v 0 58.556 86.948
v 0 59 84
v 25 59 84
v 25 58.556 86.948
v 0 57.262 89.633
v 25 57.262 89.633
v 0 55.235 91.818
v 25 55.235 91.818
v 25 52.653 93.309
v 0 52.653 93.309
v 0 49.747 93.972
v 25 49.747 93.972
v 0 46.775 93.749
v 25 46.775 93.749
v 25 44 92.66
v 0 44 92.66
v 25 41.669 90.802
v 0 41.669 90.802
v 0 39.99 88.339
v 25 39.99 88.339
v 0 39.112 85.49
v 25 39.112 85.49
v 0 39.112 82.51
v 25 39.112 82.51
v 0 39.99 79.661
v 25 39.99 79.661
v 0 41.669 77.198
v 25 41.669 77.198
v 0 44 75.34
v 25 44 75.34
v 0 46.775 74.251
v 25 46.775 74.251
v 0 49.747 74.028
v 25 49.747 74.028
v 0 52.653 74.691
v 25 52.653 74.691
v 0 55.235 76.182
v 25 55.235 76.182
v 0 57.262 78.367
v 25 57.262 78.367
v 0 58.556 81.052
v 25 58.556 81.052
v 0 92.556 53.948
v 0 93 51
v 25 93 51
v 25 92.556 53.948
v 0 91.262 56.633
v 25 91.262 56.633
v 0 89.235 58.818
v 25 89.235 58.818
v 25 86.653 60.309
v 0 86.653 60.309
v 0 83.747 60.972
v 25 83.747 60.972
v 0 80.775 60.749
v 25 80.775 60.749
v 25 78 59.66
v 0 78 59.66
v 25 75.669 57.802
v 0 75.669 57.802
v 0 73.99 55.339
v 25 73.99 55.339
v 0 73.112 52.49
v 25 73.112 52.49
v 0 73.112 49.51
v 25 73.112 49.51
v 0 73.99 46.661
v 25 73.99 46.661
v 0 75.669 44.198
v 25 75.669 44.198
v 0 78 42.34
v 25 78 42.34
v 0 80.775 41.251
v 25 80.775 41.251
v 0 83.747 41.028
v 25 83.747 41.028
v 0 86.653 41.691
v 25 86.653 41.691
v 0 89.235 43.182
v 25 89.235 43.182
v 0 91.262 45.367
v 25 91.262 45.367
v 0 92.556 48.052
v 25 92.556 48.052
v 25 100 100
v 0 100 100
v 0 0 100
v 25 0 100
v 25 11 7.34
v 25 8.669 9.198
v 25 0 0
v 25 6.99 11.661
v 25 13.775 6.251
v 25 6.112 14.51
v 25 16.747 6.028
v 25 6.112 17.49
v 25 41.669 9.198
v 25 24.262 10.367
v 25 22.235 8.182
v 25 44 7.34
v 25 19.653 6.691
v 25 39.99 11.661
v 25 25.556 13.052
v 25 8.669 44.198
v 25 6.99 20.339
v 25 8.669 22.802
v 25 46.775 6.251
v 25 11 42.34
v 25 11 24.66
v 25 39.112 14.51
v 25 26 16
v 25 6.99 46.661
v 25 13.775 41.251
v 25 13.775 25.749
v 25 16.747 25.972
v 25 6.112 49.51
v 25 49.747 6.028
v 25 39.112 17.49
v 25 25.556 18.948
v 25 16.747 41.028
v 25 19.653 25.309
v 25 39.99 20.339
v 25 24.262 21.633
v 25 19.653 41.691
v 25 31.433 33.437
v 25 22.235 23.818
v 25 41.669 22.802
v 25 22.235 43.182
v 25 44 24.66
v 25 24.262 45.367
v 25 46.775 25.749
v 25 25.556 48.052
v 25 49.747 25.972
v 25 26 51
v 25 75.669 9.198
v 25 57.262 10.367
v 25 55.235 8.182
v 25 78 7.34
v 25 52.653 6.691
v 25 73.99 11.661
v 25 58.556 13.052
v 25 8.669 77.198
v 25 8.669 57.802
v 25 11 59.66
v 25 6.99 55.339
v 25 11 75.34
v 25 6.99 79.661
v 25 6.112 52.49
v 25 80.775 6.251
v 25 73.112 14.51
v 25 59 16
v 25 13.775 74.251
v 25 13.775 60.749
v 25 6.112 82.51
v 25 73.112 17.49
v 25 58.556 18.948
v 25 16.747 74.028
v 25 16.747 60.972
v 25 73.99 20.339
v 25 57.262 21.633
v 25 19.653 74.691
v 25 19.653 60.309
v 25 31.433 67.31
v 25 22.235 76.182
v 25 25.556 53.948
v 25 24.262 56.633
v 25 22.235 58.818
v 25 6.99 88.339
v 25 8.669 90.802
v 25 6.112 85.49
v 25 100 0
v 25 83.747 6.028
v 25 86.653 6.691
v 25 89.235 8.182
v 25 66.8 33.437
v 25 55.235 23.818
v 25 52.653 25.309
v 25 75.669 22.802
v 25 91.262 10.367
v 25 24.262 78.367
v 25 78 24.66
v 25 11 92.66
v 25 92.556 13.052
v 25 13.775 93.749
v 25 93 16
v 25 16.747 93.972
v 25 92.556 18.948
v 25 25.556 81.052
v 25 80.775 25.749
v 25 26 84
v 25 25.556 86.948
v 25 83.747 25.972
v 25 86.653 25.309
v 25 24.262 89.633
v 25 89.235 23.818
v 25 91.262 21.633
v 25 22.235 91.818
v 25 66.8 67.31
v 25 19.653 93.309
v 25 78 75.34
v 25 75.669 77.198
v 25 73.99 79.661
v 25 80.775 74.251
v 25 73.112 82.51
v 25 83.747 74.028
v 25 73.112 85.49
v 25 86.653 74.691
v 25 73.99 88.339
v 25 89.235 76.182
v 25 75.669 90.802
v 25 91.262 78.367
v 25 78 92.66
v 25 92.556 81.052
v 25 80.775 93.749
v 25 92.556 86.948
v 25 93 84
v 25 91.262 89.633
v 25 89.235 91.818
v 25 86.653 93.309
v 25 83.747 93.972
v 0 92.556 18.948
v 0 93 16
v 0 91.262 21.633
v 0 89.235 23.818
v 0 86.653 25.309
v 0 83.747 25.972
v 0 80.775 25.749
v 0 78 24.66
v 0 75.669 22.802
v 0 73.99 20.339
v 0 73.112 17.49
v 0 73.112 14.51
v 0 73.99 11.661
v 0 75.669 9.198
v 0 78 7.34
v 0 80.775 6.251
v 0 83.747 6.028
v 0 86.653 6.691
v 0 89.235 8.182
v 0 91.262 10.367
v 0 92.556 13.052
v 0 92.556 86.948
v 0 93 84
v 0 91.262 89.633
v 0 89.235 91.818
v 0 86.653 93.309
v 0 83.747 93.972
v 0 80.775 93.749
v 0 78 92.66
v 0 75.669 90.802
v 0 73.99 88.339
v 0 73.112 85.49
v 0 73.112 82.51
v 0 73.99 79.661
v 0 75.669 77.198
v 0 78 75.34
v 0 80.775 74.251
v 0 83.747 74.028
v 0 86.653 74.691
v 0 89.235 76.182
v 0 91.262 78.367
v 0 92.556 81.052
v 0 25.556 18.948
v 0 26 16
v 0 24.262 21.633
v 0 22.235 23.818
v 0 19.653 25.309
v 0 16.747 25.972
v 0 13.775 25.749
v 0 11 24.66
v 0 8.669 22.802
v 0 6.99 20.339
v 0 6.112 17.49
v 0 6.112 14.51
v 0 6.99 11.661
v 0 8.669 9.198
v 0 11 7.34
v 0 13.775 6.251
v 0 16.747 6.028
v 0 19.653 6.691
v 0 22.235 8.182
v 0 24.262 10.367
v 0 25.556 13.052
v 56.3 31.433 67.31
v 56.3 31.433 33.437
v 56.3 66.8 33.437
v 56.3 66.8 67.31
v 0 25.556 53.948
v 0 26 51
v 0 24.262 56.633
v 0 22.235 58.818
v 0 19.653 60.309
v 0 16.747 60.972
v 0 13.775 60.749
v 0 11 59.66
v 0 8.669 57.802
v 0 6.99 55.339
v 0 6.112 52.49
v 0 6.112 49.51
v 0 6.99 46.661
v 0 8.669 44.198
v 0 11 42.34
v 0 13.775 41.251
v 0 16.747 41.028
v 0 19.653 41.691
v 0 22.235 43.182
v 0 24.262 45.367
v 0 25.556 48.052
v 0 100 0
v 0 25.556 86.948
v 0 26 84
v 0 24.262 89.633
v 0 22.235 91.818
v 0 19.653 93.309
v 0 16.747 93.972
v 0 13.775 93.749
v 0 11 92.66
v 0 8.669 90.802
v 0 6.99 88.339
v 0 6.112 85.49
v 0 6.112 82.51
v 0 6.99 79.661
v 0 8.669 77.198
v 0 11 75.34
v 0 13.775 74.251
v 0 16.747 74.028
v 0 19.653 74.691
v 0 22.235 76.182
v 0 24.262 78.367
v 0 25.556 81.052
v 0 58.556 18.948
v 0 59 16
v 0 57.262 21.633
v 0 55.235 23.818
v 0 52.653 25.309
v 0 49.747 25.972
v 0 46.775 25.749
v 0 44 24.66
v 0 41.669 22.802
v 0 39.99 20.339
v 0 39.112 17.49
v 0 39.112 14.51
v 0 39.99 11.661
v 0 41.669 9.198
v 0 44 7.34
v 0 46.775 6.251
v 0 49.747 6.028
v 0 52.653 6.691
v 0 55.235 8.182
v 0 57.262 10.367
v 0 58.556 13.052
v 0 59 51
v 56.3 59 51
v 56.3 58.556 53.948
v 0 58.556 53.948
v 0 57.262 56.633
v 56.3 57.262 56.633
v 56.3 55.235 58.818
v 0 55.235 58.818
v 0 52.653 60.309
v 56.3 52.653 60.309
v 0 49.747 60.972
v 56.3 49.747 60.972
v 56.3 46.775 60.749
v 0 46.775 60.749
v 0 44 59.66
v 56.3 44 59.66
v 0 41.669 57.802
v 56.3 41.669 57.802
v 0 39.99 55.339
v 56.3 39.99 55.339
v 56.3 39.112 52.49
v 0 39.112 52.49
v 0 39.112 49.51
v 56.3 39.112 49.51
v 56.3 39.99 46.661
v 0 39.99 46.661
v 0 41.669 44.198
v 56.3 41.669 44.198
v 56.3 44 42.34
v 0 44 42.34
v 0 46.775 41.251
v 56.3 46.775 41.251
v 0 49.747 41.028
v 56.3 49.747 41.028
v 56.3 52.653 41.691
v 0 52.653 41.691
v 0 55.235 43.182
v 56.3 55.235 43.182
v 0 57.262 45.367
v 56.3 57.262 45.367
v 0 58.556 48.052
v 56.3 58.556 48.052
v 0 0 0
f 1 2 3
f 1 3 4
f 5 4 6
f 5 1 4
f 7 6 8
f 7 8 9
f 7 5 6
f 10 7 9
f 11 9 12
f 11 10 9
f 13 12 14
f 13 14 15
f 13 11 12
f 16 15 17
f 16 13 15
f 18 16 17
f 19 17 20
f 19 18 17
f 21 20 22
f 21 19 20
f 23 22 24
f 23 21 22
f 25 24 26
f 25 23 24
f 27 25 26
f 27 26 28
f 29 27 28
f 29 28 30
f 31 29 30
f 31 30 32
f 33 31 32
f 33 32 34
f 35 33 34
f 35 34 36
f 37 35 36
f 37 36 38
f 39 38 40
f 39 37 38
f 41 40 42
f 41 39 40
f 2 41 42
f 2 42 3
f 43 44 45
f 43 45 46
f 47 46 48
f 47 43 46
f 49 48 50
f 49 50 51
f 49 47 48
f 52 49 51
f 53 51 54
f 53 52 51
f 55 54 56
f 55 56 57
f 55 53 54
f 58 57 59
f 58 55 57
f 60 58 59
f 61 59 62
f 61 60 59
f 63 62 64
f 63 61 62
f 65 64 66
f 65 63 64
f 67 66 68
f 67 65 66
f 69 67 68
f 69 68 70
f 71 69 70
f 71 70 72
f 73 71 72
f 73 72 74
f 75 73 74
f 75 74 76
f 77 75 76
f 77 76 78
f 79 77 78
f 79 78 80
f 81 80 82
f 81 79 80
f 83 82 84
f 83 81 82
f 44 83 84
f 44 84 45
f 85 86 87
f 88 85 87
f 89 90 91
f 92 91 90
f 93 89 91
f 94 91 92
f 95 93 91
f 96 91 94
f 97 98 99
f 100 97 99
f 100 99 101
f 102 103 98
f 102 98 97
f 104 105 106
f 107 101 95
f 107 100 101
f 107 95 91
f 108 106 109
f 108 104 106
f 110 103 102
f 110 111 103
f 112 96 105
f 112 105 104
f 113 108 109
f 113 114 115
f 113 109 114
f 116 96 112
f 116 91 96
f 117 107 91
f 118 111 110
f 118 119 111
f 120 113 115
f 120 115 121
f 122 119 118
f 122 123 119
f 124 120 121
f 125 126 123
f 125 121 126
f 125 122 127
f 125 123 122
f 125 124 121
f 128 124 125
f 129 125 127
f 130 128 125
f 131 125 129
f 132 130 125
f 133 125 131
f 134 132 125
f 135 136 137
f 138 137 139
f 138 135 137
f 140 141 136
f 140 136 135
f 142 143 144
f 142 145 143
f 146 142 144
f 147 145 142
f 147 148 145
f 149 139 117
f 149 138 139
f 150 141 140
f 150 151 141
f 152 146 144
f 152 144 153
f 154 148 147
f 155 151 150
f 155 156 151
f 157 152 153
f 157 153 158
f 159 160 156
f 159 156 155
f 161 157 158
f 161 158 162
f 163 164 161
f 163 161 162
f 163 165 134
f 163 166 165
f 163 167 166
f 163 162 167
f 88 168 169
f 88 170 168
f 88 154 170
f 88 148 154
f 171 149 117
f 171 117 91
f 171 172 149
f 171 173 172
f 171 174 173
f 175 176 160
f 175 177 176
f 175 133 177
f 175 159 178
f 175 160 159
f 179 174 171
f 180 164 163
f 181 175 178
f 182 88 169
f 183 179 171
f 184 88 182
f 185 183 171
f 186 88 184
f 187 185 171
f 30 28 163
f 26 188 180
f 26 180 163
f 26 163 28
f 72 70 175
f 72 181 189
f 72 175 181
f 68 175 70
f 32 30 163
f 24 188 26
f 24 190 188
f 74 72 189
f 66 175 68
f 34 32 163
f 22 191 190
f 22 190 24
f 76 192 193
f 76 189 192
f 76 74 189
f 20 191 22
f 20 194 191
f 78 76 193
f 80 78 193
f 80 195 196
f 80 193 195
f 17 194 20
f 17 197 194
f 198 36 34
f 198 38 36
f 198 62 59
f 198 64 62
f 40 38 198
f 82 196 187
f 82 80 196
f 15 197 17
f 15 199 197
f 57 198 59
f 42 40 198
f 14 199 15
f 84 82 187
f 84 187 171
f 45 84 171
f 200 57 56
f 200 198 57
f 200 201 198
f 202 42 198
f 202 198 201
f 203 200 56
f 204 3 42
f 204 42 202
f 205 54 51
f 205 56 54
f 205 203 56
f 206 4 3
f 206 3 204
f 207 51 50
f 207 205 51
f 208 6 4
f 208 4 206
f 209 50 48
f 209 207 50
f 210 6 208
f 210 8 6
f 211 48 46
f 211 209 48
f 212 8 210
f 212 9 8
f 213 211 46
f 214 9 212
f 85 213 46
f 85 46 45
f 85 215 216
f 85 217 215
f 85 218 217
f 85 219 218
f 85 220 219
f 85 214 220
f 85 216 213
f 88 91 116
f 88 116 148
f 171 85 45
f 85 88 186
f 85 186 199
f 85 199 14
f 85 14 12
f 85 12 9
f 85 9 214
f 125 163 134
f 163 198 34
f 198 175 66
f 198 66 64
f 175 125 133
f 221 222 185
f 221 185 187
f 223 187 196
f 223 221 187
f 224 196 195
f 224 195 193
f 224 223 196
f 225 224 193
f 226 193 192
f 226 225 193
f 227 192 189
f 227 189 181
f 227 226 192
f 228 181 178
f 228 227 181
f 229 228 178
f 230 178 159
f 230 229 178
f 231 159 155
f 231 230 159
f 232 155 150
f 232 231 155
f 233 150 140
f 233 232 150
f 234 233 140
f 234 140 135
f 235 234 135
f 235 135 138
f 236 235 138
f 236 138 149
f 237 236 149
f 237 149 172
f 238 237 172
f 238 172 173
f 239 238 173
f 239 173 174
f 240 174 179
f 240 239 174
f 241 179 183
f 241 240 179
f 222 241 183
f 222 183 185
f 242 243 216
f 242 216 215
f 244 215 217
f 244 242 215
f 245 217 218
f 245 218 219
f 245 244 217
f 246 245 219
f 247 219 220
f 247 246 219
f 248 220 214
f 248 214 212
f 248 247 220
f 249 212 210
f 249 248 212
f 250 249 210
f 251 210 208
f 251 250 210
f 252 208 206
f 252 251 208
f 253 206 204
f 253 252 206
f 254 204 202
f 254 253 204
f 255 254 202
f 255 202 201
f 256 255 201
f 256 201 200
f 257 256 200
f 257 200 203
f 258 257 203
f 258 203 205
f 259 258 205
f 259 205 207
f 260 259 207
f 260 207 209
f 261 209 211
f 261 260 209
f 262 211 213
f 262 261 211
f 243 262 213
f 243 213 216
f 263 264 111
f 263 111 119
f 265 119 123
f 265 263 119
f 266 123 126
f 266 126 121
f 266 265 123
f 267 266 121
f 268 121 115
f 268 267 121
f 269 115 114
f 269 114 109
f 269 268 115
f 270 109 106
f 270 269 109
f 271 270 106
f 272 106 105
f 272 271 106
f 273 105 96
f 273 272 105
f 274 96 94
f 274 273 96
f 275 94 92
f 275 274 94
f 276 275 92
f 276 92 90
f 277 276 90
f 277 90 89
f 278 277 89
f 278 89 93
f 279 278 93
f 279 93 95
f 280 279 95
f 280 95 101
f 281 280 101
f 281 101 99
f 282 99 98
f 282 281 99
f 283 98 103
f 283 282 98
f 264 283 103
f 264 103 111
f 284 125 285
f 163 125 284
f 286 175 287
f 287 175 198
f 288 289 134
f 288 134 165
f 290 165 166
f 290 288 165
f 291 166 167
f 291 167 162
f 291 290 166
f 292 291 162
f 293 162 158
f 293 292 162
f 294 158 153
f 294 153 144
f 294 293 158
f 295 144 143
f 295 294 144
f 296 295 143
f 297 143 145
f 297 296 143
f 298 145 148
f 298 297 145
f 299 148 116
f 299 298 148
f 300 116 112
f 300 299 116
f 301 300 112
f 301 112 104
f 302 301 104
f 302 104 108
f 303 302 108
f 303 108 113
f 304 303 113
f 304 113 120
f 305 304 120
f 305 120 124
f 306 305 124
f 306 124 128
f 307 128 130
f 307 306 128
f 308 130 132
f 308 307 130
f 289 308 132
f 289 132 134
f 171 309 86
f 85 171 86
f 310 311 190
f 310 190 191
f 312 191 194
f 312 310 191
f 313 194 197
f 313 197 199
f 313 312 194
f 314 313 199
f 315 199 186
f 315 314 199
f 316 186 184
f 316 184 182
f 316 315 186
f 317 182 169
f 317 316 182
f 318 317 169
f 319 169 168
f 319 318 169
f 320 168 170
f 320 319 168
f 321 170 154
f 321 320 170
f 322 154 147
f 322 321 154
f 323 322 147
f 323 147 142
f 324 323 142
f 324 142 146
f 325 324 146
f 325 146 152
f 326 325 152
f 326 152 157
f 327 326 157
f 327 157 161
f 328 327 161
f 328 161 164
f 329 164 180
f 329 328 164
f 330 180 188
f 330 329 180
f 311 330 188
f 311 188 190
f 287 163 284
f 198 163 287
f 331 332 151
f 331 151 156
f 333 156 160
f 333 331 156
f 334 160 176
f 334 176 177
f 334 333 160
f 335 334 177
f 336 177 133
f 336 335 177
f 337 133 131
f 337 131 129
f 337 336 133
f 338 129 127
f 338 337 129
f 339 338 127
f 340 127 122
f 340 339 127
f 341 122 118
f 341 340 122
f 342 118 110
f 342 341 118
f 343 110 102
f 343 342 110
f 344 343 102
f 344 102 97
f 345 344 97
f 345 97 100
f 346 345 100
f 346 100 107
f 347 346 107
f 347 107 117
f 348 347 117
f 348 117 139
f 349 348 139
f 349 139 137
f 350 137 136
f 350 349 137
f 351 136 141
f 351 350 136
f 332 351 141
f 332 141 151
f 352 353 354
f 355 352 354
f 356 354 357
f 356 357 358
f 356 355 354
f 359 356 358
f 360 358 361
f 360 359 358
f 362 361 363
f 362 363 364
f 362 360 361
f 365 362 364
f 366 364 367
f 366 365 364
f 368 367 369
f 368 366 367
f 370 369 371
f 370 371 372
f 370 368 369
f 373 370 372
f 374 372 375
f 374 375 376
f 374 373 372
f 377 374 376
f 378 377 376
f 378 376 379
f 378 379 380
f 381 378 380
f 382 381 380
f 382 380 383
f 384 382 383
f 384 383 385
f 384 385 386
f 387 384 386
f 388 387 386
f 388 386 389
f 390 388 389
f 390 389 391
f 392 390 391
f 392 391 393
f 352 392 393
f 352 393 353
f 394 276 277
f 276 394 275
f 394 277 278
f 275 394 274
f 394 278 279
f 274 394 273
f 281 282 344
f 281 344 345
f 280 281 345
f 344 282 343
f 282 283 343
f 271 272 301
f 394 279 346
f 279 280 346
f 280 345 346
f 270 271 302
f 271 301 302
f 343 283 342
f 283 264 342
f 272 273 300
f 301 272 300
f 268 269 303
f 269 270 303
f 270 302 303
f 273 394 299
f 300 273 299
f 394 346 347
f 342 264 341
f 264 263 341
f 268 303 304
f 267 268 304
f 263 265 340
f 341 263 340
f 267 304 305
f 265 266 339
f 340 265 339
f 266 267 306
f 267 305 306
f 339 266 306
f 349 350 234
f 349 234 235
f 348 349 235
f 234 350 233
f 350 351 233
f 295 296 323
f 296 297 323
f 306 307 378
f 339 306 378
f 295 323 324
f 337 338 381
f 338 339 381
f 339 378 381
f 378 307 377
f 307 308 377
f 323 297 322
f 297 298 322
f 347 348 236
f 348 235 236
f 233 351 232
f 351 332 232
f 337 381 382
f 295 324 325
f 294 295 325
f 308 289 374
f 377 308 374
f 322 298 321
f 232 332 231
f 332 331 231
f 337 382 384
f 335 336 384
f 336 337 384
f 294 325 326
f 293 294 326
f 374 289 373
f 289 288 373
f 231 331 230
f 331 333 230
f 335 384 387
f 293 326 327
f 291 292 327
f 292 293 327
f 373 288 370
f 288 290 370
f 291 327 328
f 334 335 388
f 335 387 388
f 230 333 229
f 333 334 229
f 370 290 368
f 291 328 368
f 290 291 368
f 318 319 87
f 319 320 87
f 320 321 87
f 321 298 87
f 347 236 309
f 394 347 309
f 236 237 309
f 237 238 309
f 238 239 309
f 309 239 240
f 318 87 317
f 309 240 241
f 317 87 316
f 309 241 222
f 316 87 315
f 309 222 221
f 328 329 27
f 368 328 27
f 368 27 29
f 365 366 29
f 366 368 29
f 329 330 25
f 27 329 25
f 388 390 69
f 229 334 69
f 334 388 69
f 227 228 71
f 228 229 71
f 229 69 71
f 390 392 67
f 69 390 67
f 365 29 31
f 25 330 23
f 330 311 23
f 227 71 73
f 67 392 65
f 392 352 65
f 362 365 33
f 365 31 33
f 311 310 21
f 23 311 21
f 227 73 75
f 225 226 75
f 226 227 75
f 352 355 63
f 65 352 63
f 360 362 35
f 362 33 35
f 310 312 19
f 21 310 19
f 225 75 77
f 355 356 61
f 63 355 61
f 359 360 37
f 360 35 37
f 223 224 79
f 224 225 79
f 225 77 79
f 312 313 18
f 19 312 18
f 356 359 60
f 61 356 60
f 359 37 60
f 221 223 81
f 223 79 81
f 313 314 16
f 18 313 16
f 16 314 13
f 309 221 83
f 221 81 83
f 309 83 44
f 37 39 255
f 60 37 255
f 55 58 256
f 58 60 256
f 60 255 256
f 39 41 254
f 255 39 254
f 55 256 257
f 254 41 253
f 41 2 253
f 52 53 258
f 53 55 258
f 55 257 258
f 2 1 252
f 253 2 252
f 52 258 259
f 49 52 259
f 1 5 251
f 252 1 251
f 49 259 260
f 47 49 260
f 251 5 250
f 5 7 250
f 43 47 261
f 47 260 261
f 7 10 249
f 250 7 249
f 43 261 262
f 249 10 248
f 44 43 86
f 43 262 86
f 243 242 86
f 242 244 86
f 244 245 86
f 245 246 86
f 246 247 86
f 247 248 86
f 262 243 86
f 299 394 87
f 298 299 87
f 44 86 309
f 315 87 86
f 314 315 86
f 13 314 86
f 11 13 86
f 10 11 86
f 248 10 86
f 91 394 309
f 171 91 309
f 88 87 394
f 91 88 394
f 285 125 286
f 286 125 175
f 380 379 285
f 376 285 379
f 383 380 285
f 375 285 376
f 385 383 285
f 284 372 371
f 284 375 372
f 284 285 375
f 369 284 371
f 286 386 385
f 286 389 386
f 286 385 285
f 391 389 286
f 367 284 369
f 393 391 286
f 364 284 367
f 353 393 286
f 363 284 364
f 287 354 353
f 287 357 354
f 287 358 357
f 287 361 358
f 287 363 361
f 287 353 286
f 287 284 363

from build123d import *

# Parameters (mm, degrees)
F0_W     = 33
F0_H     = 34
F0_R     = 10
F0_H_2   = 33
F0_W_2   = 34
F1_DEPTH = 25
F2_W     = 35.366706574
F2_H     = 33.8733626366
F2_W_2   = 35.166706574
F2_H_2   = 33.6733626366
F2_R     = 10
F3_DEPTH = 56.3


# Not quite as in the source:
# - a feature names something its author has since deleted; it is built from what else it names


with BuildPart() as f1:
    # F0 (on Right) → F1 (new body)
    with BuildSketch(Plane.YZ):
        with Locations((16.5, 50)):
            Rectangle(F0_W, F0_H)
        with Locations((16, 51)):
            Circle(F0_R, mode=Mode.SUBTRACT)
        with Locations((16.5, 83.5)):
            Rectangle(F0_W, F0_H_2)
        with Locations((16, 84)):
            Circle(F0_R, mode=Mode.SUBTRACT)
        with Locations((50, 83.5)):
            Rectangle(F0_W_2, F0_H_2)
        with Locations((49, 84)):
            Circle(F0_R, mode=Mode.SUBTRACT)
        with Locations((16.5, 16.5)):
            Rectangle(F0_W, F0_H_2)
        with Locations((16, 16)):
            Circle(F0_R, mode=Mode.SUBTRACT)
        with Locations((50, 50)):
            Rectangle(F0_W_2, F0_H)
        with Locations((49, 51)):
            Circle(F0_R, mode=Mode.SUBTRACT)
        with Locations((50, 16.5)):
            Rectangle(F0_W_2, F0_H_2)
        with Locations((49, 16)):
            Circle(F0_R, mode=Mode.SUBTRACT)
        with Locations((83.5, 16.5)):
            Rectangle(F0_W, F0_H_2)
        with Locations((83, 16)):
            Circle(F0_R, mode=Mode.SUBTRACT)
        with Locations((83.5, 50)):
            Rectangle(F0_W, F0_H)
        with Locations((83, 51)):
            Circle(F0_R, mode=Mode.SUBTRACT)
        with Locations((83.5, 83.5)):
            Rectangle(F0_W, F0_H_2)
        with Locations((83, 84)):
            Circle(F0_R, mode=Mode.SUBTRACT)
    extrude(amount=F1_DEPTH)

    # F2 (on Right) → F3 (join)
    with BuildSketch(Plane.YZ):
        with Locations((49.116646713, 50.3734805703)):
            Rectangle(F2_W, F2_H)
        with Locations((49.116646713, 50.3734805703)):
            Rectangle(F2_W_2, F2_H_2, mode=Mode.SUBTRACT)
        with Locations((49.116646713, 50.3734805703)):
            Rectangle(F2_W_2, F2_H_2)
        with Locations((49, 51)):
            Circle(F2_R, mode=Mode.SUBTRACT)
    extrude(amount=F3_DEPTH)


solid = f1.part
